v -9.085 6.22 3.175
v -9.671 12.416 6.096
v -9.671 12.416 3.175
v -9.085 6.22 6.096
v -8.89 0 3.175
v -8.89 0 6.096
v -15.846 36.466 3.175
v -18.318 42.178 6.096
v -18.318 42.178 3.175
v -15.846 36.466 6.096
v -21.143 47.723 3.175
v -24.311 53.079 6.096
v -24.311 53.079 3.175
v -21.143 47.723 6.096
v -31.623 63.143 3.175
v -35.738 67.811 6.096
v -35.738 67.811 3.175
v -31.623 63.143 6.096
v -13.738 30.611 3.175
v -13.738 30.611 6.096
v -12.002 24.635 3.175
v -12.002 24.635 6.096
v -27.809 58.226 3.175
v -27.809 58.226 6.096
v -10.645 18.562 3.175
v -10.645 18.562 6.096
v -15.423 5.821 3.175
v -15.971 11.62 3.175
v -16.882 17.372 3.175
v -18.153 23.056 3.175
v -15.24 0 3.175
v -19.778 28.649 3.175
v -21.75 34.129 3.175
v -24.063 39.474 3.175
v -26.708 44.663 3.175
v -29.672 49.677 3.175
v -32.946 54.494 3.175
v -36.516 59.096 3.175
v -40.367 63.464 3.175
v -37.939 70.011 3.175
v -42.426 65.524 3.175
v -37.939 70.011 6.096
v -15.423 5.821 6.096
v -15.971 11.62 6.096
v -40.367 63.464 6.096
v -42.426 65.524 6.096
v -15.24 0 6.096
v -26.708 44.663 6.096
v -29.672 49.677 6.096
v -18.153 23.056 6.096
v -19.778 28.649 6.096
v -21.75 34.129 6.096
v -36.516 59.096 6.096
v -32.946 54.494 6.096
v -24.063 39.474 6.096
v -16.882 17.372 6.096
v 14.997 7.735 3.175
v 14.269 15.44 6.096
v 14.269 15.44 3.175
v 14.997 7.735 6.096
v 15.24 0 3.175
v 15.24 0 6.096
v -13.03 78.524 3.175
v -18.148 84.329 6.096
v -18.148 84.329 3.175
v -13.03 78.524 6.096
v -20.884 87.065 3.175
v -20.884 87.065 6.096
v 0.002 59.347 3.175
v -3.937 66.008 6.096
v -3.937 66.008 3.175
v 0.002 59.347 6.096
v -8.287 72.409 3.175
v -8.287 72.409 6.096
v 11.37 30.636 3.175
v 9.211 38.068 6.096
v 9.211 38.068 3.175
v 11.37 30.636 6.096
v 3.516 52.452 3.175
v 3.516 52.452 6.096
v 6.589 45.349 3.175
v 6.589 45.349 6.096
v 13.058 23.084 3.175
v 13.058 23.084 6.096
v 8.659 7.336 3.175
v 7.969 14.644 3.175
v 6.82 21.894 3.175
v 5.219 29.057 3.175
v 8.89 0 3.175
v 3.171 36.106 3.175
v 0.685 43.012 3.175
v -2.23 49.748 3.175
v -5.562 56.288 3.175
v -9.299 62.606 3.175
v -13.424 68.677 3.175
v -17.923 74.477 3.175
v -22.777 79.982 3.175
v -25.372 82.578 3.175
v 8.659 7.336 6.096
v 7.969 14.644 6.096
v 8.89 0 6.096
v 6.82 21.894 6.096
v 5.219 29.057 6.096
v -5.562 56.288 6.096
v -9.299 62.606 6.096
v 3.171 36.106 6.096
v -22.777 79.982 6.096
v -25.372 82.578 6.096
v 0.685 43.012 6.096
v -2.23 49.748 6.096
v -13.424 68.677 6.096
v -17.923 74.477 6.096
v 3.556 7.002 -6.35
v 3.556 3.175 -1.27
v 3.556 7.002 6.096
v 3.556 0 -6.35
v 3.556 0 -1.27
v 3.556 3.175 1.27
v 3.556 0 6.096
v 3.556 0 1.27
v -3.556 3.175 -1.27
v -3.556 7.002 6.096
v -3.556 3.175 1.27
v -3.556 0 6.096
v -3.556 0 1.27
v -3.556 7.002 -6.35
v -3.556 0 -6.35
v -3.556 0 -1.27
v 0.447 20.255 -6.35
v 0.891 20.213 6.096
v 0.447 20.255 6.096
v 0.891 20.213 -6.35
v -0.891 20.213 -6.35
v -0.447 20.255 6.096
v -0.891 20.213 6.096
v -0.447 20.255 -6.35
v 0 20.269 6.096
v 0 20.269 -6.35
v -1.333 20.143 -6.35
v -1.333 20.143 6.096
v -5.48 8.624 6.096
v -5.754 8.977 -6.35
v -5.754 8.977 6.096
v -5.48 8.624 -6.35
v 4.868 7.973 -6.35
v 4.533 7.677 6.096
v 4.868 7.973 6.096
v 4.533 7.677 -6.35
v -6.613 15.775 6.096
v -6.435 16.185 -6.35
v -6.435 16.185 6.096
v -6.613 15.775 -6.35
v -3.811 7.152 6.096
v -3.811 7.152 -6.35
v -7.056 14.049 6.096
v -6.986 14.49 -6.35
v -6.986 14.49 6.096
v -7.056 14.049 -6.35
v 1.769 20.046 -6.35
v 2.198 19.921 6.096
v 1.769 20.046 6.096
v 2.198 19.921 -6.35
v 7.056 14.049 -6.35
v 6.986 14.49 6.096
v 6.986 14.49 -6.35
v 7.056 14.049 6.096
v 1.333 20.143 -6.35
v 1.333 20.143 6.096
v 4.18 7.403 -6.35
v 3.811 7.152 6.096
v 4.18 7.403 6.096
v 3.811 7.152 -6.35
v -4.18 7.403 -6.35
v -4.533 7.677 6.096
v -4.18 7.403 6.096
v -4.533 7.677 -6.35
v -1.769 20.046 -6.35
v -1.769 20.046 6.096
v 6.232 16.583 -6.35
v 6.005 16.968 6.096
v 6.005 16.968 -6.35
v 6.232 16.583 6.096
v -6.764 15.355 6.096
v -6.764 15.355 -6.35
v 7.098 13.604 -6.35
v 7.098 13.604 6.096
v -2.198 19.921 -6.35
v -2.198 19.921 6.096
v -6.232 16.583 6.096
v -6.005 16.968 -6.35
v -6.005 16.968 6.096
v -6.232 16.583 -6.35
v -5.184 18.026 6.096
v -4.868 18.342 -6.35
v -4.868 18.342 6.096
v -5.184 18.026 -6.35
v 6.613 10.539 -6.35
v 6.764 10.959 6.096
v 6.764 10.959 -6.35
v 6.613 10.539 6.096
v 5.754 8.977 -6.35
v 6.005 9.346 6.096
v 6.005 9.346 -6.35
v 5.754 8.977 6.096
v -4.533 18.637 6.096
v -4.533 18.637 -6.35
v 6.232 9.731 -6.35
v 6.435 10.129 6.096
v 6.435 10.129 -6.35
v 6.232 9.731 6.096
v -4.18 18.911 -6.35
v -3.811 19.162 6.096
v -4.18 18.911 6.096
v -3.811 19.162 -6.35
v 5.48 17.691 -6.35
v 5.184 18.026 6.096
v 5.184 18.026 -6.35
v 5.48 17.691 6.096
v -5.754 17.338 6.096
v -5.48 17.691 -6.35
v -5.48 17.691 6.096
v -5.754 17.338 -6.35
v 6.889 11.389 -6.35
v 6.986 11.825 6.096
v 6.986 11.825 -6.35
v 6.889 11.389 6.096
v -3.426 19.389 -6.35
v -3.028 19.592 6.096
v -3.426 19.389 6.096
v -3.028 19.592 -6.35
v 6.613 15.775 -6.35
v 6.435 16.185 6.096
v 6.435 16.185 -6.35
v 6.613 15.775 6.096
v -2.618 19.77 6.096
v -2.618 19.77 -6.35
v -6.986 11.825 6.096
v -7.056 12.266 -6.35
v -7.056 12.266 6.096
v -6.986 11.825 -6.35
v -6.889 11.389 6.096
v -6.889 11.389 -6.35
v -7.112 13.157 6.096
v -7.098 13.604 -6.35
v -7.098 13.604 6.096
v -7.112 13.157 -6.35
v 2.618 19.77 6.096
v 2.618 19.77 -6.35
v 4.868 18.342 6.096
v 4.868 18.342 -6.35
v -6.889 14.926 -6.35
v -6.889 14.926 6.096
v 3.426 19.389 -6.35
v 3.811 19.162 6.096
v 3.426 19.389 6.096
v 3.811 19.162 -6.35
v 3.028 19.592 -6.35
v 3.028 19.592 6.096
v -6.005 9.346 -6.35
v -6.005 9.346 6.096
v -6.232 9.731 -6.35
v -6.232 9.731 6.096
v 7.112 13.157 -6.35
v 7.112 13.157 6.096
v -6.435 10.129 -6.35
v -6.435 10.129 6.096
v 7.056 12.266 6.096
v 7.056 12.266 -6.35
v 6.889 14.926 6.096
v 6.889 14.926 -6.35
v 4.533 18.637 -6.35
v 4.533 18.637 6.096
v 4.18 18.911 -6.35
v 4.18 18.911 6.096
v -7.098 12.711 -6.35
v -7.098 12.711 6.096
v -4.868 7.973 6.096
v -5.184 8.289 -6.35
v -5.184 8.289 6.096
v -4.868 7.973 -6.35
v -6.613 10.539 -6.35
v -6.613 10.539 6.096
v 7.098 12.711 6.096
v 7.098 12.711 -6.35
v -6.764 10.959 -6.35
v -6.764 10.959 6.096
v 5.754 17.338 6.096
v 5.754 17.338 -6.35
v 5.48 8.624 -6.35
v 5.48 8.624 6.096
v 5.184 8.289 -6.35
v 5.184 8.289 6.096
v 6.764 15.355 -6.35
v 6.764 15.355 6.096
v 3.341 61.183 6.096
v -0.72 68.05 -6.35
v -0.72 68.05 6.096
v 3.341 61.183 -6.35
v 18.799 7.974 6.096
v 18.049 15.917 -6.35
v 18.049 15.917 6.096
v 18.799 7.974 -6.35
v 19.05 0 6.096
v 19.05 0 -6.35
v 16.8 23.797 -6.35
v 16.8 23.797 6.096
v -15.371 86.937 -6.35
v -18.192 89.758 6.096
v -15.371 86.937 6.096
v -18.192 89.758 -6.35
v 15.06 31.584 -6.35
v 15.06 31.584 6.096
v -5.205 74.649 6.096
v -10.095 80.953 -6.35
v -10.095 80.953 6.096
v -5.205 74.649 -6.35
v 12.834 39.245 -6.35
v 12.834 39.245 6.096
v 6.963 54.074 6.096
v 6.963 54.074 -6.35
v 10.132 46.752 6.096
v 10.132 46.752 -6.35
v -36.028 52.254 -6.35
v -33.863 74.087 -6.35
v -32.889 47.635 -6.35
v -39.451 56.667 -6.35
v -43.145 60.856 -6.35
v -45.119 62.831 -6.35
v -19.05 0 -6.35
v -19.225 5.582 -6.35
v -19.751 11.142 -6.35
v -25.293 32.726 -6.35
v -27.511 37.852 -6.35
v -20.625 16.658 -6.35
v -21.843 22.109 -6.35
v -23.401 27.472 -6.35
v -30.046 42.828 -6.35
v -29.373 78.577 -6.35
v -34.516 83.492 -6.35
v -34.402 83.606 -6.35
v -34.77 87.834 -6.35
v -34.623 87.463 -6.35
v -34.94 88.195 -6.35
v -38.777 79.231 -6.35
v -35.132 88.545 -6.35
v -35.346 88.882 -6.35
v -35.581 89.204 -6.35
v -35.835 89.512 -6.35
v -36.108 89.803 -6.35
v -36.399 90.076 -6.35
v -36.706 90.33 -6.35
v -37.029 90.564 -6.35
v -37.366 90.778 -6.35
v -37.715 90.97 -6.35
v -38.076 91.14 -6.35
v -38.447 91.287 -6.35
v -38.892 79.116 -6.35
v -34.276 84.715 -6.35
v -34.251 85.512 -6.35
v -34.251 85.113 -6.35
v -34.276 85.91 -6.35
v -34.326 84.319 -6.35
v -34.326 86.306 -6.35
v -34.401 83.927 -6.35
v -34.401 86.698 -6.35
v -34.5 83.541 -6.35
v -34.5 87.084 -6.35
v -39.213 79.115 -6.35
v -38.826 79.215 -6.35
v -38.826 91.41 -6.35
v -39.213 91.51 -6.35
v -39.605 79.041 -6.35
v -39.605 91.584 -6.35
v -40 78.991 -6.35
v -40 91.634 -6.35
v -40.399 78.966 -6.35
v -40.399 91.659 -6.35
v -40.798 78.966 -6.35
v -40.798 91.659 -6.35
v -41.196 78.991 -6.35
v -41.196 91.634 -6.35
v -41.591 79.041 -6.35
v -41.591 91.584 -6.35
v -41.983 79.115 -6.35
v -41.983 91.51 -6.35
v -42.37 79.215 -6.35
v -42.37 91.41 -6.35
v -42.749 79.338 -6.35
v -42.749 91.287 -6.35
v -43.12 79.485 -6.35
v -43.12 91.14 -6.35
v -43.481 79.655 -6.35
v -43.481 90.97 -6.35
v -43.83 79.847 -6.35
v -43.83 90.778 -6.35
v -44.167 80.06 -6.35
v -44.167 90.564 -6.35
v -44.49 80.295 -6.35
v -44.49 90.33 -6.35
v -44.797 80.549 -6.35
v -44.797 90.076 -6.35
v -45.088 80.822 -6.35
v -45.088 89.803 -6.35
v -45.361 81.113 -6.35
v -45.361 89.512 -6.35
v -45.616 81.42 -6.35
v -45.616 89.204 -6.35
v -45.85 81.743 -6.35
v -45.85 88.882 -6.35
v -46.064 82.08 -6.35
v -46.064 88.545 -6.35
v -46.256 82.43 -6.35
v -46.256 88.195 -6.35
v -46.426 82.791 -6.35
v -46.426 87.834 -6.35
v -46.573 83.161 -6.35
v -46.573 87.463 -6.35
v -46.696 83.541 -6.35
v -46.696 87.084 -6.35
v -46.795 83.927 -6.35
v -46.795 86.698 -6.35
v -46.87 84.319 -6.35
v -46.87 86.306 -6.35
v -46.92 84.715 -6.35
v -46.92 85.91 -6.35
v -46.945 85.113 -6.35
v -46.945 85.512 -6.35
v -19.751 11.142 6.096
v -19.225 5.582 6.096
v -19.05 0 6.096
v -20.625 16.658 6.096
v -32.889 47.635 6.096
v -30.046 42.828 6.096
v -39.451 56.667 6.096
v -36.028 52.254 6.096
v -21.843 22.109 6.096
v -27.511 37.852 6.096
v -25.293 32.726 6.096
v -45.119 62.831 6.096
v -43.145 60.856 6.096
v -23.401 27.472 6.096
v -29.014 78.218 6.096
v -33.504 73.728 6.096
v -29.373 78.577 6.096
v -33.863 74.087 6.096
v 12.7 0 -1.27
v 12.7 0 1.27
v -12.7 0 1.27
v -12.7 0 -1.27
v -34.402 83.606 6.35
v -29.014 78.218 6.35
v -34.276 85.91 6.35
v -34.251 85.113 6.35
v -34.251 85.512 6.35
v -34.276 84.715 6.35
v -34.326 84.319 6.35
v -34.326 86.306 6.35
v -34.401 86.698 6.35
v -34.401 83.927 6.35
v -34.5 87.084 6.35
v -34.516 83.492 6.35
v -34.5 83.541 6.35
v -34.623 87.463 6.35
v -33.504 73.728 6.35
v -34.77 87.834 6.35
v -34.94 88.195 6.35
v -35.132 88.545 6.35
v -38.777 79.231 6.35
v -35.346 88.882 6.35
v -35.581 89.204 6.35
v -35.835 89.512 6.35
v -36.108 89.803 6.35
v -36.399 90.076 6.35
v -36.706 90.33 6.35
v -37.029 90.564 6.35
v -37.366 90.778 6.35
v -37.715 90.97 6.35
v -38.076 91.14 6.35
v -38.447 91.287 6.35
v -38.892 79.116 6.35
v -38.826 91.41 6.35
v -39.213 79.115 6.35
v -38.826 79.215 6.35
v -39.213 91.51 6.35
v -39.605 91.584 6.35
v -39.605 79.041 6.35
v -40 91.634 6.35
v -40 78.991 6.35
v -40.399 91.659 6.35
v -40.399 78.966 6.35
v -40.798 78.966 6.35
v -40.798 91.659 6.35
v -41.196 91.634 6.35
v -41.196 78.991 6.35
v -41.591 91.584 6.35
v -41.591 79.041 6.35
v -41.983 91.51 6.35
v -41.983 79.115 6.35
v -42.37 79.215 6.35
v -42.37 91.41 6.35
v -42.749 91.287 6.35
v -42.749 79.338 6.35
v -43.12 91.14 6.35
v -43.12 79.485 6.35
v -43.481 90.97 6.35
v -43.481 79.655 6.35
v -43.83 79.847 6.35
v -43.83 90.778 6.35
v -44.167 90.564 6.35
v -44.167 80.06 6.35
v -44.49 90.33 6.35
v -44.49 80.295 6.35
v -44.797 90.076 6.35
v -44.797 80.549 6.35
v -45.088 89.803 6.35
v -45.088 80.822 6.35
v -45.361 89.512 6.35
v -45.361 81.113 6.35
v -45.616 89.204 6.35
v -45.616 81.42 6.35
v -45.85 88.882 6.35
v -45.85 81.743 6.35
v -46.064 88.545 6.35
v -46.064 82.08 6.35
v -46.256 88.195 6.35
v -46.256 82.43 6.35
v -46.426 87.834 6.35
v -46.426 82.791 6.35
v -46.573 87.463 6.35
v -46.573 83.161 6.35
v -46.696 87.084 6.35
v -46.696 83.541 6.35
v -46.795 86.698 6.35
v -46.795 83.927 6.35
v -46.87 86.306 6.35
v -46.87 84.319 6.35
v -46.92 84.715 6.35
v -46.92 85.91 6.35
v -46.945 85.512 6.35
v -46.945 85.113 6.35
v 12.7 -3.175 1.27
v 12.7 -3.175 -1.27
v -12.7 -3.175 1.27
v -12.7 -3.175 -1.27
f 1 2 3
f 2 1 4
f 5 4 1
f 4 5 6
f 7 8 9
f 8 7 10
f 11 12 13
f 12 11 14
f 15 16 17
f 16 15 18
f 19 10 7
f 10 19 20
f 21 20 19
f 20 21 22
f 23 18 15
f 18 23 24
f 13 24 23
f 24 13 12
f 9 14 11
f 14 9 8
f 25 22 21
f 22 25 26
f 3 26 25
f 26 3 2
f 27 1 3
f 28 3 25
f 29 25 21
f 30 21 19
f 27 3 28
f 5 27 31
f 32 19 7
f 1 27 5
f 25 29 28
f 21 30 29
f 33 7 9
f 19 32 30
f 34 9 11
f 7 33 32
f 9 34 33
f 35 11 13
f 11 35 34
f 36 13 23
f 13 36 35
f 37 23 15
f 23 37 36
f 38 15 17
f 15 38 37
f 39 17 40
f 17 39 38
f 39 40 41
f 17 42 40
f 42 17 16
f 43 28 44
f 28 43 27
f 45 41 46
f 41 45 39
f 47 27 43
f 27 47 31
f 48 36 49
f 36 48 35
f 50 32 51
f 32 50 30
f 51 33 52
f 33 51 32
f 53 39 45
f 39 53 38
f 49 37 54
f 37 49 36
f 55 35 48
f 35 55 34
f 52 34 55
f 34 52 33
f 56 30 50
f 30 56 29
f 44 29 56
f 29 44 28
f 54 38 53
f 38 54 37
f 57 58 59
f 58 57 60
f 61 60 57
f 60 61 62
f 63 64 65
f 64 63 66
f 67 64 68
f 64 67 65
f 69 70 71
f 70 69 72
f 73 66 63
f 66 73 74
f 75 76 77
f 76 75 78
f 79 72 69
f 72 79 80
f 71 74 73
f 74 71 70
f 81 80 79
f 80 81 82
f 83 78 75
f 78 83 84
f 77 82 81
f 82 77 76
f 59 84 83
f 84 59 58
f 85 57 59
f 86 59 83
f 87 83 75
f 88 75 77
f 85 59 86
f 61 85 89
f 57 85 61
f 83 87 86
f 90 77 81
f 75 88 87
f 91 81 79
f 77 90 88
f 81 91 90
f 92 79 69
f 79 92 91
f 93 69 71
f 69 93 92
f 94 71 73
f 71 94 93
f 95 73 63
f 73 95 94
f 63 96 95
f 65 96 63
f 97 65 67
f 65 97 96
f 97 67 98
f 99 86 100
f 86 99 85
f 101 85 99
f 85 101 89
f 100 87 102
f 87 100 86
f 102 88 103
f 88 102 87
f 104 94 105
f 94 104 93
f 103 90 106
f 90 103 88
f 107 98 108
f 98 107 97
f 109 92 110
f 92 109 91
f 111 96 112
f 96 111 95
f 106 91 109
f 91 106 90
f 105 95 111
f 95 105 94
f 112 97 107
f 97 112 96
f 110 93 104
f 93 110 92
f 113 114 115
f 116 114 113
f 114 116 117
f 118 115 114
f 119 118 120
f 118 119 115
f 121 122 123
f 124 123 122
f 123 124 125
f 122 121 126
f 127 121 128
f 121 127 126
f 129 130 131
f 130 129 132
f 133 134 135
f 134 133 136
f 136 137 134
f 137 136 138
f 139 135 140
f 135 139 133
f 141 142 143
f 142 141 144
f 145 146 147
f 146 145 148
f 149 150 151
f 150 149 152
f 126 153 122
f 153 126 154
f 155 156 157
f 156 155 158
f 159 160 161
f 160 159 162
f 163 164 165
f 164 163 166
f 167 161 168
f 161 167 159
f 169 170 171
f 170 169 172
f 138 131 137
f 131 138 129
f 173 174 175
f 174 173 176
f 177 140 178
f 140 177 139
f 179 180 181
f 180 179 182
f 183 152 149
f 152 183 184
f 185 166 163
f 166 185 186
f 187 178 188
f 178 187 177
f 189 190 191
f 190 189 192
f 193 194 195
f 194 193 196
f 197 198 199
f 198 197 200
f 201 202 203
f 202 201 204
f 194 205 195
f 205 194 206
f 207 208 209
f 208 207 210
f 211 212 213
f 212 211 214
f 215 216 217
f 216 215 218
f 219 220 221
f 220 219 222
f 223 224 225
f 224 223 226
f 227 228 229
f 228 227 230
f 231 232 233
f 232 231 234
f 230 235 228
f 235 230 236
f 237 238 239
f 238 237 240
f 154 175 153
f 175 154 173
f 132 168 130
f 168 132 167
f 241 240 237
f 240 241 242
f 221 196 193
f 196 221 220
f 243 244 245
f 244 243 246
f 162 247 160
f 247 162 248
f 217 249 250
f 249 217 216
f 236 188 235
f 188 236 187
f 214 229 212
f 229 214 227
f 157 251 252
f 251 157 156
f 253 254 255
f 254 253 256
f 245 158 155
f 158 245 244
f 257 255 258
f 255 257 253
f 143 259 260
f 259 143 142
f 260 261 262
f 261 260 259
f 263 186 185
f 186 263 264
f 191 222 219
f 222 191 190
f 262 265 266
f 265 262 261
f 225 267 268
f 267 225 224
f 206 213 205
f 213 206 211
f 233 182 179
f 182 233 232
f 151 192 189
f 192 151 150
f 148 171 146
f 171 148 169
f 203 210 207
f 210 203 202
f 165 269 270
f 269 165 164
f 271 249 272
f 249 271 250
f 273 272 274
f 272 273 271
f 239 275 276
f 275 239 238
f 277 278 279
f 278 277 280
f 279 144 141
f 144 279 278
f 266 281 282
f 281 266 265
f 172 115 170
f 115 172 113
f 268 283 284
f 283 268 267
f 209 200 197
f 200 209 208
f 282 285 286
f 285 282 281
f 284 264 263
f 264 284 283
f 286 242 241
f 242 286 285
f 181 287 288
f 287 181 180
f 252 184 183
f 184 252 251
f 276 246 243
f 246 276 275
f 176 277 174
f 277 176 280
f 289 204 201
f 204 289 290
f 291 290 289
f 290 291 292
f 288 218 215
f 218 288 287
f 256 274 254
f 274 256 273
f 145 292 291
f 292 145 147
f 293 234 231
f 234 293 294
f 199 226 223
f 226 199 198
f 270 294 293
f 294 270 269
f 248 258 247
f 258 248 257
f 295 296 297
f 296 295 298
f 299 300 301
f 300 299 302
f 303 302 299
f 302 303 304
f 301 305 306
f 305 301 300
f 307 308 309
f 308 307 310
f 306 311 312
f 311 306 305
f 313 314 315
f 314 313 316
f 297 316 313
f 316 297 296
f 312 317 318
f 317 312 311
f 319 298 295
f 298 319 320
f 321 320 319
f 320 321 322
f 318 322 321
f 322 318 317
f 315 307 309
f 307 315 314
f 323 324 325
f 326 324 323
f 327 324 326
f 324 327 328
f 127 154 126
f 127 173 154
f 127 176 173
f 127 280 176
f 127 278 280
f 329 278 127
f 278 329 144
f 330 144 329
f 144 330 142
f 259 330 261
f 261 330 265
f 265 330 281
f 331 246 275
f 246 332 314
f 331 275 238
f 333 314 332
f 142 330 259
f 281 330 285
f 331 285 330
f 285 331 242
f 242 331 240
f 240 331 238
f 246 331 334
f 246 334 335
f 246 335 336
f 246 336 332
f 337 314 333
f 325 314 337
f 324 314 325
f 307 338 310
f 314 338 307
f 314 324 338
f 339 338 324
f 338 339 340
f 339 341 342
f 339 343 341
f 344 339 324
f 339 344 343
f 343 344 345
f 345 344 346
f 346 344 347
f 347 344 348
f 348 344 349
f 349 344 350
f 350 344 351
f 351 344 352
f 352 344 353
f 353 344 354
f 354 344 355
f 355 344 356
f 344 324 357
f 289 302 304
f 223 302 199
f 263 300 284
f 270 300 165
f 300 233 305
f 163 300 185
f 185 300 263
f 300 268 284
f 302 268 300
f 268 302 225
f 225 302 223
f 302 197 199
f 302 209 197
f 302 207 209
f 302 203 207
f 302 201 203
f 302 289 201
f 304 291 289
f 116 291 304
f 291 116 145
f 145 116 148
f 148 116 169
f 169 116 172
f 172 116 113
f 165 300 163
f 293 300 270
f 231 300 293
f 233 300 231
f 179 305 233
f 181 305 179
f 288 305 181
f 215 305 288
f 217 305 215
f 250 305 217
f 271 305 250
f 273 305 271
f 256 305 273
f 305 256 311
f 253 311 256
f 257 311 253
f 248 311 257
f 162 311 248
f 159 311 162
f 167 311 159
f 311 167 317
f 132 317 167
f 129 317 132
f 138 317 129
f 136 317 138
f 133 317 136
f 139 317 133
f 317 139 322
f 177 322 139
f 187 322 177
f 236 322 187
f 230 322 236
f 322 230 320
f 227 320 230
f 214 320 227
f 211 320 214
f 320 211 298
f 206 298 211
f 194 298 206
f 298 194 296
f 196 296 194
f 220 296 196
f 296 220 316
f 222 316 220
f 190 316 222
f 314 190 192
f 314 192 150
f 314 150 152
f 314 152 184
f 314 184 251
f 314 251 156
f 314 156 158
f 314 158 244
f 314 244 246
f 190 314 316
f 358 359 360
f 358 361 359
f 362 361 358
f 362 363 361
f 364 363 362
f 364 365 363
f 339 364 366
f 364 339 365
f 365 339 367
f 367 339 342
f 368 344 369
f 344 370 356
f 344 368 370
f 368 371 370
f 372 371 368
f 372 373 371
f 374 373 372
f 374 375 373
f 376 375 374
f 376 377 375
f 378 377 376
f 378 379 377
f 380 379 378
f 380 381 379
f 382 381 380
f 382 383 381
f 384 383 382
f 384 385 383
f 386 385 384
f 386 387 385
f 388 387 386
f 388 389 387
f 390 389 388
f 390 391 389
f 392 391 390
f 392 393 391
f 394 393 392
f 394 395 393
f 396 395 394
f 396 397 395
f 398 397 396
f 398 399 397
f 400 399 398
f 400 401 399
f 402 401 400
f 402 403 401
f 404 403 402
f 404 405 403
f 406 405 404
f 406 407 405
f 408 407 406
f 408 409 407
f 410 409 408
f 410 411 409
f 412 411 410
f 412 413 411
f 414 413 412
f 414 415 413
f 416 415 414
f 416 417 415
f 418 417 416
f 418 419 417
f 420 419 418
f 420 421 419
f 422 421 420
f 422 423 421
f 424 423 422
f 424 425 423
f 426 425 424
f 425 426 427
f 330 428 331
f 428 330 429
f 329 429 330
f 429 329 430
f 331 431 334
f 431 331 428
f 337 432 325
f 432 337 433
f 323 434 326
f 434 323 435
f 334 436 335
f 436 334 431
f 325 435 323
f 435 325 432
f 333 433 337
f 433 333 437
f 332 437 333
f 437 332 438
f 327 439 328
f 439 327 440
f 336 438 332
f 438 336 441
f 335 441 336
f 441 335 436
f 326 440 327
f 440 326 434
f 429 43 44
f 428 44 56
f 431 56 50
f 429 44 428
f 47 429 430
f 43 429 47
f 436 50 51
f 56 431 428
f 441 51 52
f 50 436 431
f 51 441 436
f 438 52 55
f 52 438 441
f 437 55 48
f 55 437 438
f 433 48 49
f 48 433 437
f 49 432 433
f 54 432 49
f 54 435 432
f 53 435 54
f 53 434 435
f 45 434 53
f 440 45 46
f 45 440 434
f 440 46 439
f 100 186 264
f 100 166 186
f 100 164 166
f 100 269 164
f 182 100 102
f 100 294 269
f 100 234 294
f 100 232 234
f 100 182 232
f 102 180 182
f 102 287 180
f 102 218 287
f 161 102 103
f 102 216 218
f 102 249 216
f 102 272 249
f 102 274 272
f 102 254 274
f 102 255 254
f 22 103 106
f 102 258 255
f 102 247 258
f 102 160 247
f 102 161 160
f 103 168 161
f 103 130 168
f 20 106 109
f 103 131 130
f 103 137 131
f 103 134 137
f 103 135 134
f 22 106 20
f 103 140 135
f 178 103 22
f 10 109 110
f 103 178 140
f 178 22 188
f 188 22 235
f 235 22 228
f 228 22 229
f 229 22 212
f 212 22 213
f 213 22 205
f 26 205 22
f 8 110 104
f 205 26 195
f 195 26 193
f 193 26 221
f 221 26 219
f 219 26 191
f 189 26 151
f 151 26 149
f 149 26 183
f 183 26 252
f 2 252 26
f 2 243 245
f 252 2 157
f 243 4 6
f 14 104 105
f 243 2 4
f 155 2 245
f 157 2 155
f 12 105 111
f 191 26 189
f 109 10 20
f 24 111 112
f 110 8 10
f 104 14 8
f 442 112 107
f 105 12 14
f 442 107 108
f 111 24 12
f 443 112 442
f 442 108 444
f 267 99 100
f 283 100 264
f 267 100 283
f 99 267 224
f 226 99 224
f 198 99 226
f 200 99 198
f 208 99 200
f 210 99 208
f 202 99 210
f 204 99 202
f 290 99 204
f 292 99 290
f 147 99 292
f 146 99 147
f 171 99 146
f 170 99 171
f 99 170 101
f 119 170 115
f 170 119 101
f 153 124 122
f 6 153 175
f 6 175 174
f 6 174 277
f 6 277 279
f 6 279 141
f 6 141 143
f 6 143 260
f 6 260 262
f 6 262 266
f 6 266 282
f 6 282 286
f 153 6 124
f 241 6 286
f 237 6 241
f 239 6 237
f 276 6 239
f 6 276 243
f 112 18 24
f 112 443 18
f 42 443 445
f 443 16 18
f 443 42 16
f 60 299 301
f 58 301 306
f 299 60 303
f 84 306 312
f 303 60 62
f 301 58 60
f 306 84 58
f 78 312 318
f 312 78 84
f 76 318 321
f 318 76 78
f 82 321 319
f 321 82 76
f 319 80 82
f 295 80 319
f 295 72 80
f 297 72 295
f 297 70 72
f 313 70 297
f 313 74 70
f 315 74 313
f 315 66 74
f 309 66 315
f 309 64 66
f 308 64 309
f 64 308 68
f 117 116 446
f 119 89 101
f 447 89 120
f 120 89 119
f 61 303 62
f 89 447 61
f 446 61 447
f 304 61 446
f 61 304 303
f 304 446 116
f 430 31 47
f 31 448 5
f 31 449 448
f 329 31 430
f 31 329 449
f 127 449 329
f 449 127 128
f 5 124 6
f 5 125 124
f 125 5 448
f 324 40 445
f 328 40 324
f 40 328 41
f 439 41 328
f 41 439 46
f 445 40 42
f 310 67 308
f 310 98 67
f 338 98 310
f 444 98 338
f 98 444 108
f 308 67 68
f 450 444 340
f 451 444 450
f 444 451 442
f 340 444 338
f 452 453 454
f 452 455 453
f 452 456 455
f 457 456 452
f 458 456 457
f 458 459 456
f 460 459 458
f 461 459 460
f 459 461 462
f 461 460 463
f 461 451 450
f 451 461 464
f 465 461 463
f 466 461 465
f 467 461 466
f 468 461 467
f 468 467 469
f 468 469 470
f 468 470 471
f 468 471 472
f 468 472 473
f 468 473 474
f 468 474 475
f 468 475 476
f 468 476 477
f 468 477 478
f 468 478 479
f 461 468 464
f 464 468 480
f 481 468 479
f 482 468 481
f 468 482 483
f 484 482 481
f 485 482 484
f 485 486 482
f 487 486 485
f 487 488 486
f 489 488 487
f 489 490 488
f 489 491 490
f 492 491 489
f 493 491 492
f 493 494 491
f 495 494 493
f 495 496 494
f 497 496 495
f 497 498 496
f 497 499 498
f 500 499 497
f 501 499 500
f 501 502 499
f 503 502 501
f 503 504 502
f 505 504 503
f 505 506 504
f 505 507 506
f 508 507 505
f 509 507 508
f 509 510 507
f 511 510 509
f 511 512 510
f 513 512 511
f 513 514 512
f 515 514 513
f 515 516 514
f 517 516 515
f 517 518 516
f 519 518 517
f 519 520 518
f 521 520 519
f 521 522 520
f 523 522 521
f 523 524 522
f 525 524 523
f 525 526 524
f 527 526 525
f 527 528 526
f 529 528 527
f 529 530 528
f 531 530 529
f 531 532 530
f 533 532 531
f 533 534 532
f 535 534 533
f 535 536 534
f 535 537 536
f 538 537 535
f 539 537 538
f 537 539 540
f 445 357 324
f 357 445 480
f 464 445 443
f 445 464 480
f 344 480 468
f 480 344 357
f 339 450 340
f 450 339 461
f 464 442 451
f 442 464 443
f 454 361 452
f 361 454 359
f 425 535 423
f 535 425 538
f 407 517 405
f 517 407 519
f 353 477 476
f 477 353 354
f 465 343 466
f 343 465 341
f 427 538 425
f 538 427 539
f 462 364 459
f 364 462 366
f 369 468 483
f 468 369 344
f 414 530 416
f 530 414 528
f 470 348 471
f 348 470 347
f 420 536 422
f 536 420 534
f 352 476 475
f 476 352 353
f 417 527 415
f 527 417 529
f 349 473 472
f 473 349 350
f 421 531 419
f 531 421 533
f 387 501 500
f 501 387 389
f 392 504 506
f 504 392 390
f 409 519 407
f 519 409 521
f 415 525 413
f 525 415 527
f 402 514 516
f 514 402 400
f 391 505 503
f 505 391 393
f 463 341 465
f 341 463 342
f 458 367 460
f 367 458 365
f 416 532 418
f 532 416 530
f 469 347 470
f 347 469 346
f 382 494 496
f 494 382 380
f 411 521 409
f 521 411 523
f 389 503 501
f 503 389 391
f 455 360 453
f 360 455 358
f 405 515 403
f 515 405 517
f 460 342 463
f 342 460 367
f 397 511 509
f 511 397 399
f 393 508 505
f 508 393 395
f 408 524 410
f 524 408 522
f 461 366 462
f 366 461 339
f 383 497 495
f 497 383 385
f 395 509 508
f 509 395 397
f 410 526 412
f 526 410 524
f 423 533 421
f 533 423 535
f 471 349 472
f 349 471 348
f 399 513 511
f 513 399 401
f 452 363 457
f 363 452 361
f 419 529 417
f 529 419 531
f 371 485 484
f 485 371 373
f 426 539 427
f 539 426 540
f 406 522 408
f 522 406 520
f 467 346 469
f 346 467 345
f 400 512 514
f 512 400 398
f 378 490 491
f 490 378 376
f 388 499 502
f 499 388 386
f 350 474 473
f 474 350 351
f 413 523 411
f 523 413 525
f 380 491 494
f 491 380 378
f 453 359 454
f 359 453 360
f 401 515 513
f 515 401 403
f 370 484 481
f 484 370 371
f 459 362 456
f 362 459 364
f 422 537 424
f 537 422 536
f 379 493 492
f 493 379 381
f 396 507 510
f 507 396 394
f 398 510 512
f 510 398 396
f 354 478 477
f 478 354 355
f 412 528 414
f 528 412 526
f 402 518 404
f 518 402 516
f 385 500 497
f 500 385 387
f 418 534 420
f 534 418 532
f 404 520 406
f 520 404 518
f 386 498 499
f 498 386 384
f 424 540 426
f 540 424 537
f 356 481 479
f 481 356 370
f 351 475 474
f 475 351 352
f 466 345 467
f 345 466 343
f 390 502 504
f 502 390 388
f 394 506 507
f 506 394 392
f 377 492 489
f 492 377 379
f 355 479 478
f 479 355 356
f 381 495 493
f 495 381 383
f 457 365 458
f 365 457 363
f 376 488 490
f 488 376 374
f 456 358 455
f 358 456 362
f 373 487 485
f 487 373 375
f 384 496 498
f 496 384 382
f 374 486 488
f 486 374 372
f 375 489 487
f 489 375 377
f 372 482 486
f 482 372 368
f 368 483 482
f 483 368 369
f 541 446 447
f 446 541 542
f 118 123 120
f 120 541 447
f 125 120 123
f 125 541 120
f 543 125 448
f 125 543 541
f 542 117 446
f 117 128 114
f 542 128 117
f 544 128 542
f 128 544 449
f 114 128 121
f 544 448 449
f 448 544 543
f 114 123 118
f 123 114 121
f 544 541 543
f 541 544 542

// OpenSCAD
// file: track_curved.scad
use <tracks_lib.scad>

module triangle_block(len) {
  color([28,28,0,1])
    difference() {
      cube(size=[len,len,inches(0.5)], center=false);
      translate([0,0,-0.1]) rotate([0,0,45]) cube(size=[len*2,len*2,inches(0.55)], center=false);
    }
}

module curved_rail(radius) {
  //color([255,0,0,0.8])
  difference() {
    cylinder(h=inches(0.13), r=radius, center=true,$fn=100);
    cylinder(h=inches(0.131), r=(radius-inches(0.25)), center=true,$fn=100);
  }
}

module left_curved_track() {
  union() {
    intersection() {
      difference() {
        cylinder(h=inches(0.5), r=inches(5), center=true,$fn=100);
        cylinder(h=inches(0.51), r=inches(3.5), center=true,$fn=100);

        translate([0,0,inches(0.19)]) {
          curved_rail(inches(3.9));
          curved_rail(inches(4.85));
        }

        translate([inches(4.25),inches(0.148),0]) {
          innie_connector(inches(0.6));
        }
      }
      translate([0,0,inches(-0.26)]) {
        triangle_block(inches(7));
      }
    }

    rotate([0,0,45]) translate([inches(4.25),inches(0.13),0]) {
       outie_connector(inches(0.5));
    }

  }
}

module right_curved_track() {
  translate([inches(7),0,0])
  mirror([1,0,0])
  left_curved_track();
}

translate([inches(-3.5),inches(-2),0]) left_curved_track();
// translate([inches(-3.5),inches(-2),0]) right_curved_track();
// file: track_straight.scad
use <tracks_lib.scad>

module rail_cube(length) {
  cube(size = [inches(0.25),length+inches(0.1),inches(0.13)], center = true);
}

module straight_track(length) {
    union() {
      difference() {
        // main block
        cube(size = [inches(1+5/8),length,inches(0.5)], center = true);

        // right rail
        translate([inches(0.5),0,inches(0.19)]) {
          rail_cube(length);
        }

        // left rail
        translate([inches(-0.5),0,inches(0.19)]) {
          rail_cube(length);
        }

        translate([0,0-(length/2)-inches(-0.14),0]) {
          innie_connector(inches(0.6));
        }
      }

      translate([0,(length/2)+inches(0.15),0]) {
        outie_connector(inches(0.5));
      }
  
    }
}

straight_track(inches(3));
// file: tracks_lib.scad
function inches(in) = in*25.4;

module outie_connector(z) {
  union() {
   cube([inches(0.25),inches(0.3),z], center=true);
   translate([0,inches(0.37),0]) {
    rotate([0,0,90]) cylinder(h=inches(0.50),r=inches(0.25),center=true,$fn=100); 
   }
  }
}

module innie_connector(z) {
  union() {
   cube([inches(0.28),inches(0.3),z], center=true);
   translate([0,inches(0.37),0]) {
    rotate([0,0,90]) cylinder(h=inches(0.51),r=inches(0.28),center=true,$fn=100); 
   }
  }
}

module train_proxy() {
  color([128,0,128,1]) cube([inches(1),inches(0.25),inches(0.1)], center=true);
}
// main file
use <tracks_lib.scad>
use <track_straight.scad>
use <track_curved.scad>

module demo() {
  straight_track();
//  translate([inches(0),inches(-2.02),0]) straight_track();

  translate([inches(-1.8),inches(0),0]) left_curved_track();
//  translate([inches(0.32),inches(-0.725),0]) rotate([0,0,-45]) translate([inches(-2),inches(-1),0]) left_curved_track();

  translate([inches(-4.8),inches(0),0]) right_curved_track();
//  translate([inches(-3),inches(-2.725),0]) rotate([0,0,45]) translate([inches(-2),inches(-1),0]) right_curved_track();

}

module train_proxy() {
  //translate([inches(4.25),0,inches(0.25)])
  color([128,0,128,1]) cube([inches(1),inches(0.25),inches(0.1)], center=true);
}

// material is 24"x48"

module straight_track_sheet() {
  x_offset = inches(7/8);
  y_offset = 0;
  for (y = [0:15]) {
    for (x = [0:10]) {
      if (y%2==0) {
        translate([x*inches(2.0),y*inches(2.75),0]) {
          straight_track();
        }
      } else {
        translate([x*inches(2.0) + x_offset,y*inches(2.75)+inches(0.25),0]) {
          rotate([0,0,180]) straight_track();
        }
      }
    }
  }
}

module curved_track_sheet() {
  x_offset = inches(7/8);
  y_offset = 0;
  for (y = [0:5]) {
    for (x = [0:6]) {
      if (y%2==0) {
        translate([x*inches(2.0),y*inches(4.25),0]) {
          rotate([0,0,-20]) left_curved_track();
        }
      } else {
        translate([x*inches(2.0)+inches(0.75),y*inches(4.25)-inches(2.25),0]) {
          rotate([0,0,20]) right_curved_track();
        }
      }
    }
  }
}

translate([inches(-4.25),0,0]) left_curved_track();
train_proxy();
